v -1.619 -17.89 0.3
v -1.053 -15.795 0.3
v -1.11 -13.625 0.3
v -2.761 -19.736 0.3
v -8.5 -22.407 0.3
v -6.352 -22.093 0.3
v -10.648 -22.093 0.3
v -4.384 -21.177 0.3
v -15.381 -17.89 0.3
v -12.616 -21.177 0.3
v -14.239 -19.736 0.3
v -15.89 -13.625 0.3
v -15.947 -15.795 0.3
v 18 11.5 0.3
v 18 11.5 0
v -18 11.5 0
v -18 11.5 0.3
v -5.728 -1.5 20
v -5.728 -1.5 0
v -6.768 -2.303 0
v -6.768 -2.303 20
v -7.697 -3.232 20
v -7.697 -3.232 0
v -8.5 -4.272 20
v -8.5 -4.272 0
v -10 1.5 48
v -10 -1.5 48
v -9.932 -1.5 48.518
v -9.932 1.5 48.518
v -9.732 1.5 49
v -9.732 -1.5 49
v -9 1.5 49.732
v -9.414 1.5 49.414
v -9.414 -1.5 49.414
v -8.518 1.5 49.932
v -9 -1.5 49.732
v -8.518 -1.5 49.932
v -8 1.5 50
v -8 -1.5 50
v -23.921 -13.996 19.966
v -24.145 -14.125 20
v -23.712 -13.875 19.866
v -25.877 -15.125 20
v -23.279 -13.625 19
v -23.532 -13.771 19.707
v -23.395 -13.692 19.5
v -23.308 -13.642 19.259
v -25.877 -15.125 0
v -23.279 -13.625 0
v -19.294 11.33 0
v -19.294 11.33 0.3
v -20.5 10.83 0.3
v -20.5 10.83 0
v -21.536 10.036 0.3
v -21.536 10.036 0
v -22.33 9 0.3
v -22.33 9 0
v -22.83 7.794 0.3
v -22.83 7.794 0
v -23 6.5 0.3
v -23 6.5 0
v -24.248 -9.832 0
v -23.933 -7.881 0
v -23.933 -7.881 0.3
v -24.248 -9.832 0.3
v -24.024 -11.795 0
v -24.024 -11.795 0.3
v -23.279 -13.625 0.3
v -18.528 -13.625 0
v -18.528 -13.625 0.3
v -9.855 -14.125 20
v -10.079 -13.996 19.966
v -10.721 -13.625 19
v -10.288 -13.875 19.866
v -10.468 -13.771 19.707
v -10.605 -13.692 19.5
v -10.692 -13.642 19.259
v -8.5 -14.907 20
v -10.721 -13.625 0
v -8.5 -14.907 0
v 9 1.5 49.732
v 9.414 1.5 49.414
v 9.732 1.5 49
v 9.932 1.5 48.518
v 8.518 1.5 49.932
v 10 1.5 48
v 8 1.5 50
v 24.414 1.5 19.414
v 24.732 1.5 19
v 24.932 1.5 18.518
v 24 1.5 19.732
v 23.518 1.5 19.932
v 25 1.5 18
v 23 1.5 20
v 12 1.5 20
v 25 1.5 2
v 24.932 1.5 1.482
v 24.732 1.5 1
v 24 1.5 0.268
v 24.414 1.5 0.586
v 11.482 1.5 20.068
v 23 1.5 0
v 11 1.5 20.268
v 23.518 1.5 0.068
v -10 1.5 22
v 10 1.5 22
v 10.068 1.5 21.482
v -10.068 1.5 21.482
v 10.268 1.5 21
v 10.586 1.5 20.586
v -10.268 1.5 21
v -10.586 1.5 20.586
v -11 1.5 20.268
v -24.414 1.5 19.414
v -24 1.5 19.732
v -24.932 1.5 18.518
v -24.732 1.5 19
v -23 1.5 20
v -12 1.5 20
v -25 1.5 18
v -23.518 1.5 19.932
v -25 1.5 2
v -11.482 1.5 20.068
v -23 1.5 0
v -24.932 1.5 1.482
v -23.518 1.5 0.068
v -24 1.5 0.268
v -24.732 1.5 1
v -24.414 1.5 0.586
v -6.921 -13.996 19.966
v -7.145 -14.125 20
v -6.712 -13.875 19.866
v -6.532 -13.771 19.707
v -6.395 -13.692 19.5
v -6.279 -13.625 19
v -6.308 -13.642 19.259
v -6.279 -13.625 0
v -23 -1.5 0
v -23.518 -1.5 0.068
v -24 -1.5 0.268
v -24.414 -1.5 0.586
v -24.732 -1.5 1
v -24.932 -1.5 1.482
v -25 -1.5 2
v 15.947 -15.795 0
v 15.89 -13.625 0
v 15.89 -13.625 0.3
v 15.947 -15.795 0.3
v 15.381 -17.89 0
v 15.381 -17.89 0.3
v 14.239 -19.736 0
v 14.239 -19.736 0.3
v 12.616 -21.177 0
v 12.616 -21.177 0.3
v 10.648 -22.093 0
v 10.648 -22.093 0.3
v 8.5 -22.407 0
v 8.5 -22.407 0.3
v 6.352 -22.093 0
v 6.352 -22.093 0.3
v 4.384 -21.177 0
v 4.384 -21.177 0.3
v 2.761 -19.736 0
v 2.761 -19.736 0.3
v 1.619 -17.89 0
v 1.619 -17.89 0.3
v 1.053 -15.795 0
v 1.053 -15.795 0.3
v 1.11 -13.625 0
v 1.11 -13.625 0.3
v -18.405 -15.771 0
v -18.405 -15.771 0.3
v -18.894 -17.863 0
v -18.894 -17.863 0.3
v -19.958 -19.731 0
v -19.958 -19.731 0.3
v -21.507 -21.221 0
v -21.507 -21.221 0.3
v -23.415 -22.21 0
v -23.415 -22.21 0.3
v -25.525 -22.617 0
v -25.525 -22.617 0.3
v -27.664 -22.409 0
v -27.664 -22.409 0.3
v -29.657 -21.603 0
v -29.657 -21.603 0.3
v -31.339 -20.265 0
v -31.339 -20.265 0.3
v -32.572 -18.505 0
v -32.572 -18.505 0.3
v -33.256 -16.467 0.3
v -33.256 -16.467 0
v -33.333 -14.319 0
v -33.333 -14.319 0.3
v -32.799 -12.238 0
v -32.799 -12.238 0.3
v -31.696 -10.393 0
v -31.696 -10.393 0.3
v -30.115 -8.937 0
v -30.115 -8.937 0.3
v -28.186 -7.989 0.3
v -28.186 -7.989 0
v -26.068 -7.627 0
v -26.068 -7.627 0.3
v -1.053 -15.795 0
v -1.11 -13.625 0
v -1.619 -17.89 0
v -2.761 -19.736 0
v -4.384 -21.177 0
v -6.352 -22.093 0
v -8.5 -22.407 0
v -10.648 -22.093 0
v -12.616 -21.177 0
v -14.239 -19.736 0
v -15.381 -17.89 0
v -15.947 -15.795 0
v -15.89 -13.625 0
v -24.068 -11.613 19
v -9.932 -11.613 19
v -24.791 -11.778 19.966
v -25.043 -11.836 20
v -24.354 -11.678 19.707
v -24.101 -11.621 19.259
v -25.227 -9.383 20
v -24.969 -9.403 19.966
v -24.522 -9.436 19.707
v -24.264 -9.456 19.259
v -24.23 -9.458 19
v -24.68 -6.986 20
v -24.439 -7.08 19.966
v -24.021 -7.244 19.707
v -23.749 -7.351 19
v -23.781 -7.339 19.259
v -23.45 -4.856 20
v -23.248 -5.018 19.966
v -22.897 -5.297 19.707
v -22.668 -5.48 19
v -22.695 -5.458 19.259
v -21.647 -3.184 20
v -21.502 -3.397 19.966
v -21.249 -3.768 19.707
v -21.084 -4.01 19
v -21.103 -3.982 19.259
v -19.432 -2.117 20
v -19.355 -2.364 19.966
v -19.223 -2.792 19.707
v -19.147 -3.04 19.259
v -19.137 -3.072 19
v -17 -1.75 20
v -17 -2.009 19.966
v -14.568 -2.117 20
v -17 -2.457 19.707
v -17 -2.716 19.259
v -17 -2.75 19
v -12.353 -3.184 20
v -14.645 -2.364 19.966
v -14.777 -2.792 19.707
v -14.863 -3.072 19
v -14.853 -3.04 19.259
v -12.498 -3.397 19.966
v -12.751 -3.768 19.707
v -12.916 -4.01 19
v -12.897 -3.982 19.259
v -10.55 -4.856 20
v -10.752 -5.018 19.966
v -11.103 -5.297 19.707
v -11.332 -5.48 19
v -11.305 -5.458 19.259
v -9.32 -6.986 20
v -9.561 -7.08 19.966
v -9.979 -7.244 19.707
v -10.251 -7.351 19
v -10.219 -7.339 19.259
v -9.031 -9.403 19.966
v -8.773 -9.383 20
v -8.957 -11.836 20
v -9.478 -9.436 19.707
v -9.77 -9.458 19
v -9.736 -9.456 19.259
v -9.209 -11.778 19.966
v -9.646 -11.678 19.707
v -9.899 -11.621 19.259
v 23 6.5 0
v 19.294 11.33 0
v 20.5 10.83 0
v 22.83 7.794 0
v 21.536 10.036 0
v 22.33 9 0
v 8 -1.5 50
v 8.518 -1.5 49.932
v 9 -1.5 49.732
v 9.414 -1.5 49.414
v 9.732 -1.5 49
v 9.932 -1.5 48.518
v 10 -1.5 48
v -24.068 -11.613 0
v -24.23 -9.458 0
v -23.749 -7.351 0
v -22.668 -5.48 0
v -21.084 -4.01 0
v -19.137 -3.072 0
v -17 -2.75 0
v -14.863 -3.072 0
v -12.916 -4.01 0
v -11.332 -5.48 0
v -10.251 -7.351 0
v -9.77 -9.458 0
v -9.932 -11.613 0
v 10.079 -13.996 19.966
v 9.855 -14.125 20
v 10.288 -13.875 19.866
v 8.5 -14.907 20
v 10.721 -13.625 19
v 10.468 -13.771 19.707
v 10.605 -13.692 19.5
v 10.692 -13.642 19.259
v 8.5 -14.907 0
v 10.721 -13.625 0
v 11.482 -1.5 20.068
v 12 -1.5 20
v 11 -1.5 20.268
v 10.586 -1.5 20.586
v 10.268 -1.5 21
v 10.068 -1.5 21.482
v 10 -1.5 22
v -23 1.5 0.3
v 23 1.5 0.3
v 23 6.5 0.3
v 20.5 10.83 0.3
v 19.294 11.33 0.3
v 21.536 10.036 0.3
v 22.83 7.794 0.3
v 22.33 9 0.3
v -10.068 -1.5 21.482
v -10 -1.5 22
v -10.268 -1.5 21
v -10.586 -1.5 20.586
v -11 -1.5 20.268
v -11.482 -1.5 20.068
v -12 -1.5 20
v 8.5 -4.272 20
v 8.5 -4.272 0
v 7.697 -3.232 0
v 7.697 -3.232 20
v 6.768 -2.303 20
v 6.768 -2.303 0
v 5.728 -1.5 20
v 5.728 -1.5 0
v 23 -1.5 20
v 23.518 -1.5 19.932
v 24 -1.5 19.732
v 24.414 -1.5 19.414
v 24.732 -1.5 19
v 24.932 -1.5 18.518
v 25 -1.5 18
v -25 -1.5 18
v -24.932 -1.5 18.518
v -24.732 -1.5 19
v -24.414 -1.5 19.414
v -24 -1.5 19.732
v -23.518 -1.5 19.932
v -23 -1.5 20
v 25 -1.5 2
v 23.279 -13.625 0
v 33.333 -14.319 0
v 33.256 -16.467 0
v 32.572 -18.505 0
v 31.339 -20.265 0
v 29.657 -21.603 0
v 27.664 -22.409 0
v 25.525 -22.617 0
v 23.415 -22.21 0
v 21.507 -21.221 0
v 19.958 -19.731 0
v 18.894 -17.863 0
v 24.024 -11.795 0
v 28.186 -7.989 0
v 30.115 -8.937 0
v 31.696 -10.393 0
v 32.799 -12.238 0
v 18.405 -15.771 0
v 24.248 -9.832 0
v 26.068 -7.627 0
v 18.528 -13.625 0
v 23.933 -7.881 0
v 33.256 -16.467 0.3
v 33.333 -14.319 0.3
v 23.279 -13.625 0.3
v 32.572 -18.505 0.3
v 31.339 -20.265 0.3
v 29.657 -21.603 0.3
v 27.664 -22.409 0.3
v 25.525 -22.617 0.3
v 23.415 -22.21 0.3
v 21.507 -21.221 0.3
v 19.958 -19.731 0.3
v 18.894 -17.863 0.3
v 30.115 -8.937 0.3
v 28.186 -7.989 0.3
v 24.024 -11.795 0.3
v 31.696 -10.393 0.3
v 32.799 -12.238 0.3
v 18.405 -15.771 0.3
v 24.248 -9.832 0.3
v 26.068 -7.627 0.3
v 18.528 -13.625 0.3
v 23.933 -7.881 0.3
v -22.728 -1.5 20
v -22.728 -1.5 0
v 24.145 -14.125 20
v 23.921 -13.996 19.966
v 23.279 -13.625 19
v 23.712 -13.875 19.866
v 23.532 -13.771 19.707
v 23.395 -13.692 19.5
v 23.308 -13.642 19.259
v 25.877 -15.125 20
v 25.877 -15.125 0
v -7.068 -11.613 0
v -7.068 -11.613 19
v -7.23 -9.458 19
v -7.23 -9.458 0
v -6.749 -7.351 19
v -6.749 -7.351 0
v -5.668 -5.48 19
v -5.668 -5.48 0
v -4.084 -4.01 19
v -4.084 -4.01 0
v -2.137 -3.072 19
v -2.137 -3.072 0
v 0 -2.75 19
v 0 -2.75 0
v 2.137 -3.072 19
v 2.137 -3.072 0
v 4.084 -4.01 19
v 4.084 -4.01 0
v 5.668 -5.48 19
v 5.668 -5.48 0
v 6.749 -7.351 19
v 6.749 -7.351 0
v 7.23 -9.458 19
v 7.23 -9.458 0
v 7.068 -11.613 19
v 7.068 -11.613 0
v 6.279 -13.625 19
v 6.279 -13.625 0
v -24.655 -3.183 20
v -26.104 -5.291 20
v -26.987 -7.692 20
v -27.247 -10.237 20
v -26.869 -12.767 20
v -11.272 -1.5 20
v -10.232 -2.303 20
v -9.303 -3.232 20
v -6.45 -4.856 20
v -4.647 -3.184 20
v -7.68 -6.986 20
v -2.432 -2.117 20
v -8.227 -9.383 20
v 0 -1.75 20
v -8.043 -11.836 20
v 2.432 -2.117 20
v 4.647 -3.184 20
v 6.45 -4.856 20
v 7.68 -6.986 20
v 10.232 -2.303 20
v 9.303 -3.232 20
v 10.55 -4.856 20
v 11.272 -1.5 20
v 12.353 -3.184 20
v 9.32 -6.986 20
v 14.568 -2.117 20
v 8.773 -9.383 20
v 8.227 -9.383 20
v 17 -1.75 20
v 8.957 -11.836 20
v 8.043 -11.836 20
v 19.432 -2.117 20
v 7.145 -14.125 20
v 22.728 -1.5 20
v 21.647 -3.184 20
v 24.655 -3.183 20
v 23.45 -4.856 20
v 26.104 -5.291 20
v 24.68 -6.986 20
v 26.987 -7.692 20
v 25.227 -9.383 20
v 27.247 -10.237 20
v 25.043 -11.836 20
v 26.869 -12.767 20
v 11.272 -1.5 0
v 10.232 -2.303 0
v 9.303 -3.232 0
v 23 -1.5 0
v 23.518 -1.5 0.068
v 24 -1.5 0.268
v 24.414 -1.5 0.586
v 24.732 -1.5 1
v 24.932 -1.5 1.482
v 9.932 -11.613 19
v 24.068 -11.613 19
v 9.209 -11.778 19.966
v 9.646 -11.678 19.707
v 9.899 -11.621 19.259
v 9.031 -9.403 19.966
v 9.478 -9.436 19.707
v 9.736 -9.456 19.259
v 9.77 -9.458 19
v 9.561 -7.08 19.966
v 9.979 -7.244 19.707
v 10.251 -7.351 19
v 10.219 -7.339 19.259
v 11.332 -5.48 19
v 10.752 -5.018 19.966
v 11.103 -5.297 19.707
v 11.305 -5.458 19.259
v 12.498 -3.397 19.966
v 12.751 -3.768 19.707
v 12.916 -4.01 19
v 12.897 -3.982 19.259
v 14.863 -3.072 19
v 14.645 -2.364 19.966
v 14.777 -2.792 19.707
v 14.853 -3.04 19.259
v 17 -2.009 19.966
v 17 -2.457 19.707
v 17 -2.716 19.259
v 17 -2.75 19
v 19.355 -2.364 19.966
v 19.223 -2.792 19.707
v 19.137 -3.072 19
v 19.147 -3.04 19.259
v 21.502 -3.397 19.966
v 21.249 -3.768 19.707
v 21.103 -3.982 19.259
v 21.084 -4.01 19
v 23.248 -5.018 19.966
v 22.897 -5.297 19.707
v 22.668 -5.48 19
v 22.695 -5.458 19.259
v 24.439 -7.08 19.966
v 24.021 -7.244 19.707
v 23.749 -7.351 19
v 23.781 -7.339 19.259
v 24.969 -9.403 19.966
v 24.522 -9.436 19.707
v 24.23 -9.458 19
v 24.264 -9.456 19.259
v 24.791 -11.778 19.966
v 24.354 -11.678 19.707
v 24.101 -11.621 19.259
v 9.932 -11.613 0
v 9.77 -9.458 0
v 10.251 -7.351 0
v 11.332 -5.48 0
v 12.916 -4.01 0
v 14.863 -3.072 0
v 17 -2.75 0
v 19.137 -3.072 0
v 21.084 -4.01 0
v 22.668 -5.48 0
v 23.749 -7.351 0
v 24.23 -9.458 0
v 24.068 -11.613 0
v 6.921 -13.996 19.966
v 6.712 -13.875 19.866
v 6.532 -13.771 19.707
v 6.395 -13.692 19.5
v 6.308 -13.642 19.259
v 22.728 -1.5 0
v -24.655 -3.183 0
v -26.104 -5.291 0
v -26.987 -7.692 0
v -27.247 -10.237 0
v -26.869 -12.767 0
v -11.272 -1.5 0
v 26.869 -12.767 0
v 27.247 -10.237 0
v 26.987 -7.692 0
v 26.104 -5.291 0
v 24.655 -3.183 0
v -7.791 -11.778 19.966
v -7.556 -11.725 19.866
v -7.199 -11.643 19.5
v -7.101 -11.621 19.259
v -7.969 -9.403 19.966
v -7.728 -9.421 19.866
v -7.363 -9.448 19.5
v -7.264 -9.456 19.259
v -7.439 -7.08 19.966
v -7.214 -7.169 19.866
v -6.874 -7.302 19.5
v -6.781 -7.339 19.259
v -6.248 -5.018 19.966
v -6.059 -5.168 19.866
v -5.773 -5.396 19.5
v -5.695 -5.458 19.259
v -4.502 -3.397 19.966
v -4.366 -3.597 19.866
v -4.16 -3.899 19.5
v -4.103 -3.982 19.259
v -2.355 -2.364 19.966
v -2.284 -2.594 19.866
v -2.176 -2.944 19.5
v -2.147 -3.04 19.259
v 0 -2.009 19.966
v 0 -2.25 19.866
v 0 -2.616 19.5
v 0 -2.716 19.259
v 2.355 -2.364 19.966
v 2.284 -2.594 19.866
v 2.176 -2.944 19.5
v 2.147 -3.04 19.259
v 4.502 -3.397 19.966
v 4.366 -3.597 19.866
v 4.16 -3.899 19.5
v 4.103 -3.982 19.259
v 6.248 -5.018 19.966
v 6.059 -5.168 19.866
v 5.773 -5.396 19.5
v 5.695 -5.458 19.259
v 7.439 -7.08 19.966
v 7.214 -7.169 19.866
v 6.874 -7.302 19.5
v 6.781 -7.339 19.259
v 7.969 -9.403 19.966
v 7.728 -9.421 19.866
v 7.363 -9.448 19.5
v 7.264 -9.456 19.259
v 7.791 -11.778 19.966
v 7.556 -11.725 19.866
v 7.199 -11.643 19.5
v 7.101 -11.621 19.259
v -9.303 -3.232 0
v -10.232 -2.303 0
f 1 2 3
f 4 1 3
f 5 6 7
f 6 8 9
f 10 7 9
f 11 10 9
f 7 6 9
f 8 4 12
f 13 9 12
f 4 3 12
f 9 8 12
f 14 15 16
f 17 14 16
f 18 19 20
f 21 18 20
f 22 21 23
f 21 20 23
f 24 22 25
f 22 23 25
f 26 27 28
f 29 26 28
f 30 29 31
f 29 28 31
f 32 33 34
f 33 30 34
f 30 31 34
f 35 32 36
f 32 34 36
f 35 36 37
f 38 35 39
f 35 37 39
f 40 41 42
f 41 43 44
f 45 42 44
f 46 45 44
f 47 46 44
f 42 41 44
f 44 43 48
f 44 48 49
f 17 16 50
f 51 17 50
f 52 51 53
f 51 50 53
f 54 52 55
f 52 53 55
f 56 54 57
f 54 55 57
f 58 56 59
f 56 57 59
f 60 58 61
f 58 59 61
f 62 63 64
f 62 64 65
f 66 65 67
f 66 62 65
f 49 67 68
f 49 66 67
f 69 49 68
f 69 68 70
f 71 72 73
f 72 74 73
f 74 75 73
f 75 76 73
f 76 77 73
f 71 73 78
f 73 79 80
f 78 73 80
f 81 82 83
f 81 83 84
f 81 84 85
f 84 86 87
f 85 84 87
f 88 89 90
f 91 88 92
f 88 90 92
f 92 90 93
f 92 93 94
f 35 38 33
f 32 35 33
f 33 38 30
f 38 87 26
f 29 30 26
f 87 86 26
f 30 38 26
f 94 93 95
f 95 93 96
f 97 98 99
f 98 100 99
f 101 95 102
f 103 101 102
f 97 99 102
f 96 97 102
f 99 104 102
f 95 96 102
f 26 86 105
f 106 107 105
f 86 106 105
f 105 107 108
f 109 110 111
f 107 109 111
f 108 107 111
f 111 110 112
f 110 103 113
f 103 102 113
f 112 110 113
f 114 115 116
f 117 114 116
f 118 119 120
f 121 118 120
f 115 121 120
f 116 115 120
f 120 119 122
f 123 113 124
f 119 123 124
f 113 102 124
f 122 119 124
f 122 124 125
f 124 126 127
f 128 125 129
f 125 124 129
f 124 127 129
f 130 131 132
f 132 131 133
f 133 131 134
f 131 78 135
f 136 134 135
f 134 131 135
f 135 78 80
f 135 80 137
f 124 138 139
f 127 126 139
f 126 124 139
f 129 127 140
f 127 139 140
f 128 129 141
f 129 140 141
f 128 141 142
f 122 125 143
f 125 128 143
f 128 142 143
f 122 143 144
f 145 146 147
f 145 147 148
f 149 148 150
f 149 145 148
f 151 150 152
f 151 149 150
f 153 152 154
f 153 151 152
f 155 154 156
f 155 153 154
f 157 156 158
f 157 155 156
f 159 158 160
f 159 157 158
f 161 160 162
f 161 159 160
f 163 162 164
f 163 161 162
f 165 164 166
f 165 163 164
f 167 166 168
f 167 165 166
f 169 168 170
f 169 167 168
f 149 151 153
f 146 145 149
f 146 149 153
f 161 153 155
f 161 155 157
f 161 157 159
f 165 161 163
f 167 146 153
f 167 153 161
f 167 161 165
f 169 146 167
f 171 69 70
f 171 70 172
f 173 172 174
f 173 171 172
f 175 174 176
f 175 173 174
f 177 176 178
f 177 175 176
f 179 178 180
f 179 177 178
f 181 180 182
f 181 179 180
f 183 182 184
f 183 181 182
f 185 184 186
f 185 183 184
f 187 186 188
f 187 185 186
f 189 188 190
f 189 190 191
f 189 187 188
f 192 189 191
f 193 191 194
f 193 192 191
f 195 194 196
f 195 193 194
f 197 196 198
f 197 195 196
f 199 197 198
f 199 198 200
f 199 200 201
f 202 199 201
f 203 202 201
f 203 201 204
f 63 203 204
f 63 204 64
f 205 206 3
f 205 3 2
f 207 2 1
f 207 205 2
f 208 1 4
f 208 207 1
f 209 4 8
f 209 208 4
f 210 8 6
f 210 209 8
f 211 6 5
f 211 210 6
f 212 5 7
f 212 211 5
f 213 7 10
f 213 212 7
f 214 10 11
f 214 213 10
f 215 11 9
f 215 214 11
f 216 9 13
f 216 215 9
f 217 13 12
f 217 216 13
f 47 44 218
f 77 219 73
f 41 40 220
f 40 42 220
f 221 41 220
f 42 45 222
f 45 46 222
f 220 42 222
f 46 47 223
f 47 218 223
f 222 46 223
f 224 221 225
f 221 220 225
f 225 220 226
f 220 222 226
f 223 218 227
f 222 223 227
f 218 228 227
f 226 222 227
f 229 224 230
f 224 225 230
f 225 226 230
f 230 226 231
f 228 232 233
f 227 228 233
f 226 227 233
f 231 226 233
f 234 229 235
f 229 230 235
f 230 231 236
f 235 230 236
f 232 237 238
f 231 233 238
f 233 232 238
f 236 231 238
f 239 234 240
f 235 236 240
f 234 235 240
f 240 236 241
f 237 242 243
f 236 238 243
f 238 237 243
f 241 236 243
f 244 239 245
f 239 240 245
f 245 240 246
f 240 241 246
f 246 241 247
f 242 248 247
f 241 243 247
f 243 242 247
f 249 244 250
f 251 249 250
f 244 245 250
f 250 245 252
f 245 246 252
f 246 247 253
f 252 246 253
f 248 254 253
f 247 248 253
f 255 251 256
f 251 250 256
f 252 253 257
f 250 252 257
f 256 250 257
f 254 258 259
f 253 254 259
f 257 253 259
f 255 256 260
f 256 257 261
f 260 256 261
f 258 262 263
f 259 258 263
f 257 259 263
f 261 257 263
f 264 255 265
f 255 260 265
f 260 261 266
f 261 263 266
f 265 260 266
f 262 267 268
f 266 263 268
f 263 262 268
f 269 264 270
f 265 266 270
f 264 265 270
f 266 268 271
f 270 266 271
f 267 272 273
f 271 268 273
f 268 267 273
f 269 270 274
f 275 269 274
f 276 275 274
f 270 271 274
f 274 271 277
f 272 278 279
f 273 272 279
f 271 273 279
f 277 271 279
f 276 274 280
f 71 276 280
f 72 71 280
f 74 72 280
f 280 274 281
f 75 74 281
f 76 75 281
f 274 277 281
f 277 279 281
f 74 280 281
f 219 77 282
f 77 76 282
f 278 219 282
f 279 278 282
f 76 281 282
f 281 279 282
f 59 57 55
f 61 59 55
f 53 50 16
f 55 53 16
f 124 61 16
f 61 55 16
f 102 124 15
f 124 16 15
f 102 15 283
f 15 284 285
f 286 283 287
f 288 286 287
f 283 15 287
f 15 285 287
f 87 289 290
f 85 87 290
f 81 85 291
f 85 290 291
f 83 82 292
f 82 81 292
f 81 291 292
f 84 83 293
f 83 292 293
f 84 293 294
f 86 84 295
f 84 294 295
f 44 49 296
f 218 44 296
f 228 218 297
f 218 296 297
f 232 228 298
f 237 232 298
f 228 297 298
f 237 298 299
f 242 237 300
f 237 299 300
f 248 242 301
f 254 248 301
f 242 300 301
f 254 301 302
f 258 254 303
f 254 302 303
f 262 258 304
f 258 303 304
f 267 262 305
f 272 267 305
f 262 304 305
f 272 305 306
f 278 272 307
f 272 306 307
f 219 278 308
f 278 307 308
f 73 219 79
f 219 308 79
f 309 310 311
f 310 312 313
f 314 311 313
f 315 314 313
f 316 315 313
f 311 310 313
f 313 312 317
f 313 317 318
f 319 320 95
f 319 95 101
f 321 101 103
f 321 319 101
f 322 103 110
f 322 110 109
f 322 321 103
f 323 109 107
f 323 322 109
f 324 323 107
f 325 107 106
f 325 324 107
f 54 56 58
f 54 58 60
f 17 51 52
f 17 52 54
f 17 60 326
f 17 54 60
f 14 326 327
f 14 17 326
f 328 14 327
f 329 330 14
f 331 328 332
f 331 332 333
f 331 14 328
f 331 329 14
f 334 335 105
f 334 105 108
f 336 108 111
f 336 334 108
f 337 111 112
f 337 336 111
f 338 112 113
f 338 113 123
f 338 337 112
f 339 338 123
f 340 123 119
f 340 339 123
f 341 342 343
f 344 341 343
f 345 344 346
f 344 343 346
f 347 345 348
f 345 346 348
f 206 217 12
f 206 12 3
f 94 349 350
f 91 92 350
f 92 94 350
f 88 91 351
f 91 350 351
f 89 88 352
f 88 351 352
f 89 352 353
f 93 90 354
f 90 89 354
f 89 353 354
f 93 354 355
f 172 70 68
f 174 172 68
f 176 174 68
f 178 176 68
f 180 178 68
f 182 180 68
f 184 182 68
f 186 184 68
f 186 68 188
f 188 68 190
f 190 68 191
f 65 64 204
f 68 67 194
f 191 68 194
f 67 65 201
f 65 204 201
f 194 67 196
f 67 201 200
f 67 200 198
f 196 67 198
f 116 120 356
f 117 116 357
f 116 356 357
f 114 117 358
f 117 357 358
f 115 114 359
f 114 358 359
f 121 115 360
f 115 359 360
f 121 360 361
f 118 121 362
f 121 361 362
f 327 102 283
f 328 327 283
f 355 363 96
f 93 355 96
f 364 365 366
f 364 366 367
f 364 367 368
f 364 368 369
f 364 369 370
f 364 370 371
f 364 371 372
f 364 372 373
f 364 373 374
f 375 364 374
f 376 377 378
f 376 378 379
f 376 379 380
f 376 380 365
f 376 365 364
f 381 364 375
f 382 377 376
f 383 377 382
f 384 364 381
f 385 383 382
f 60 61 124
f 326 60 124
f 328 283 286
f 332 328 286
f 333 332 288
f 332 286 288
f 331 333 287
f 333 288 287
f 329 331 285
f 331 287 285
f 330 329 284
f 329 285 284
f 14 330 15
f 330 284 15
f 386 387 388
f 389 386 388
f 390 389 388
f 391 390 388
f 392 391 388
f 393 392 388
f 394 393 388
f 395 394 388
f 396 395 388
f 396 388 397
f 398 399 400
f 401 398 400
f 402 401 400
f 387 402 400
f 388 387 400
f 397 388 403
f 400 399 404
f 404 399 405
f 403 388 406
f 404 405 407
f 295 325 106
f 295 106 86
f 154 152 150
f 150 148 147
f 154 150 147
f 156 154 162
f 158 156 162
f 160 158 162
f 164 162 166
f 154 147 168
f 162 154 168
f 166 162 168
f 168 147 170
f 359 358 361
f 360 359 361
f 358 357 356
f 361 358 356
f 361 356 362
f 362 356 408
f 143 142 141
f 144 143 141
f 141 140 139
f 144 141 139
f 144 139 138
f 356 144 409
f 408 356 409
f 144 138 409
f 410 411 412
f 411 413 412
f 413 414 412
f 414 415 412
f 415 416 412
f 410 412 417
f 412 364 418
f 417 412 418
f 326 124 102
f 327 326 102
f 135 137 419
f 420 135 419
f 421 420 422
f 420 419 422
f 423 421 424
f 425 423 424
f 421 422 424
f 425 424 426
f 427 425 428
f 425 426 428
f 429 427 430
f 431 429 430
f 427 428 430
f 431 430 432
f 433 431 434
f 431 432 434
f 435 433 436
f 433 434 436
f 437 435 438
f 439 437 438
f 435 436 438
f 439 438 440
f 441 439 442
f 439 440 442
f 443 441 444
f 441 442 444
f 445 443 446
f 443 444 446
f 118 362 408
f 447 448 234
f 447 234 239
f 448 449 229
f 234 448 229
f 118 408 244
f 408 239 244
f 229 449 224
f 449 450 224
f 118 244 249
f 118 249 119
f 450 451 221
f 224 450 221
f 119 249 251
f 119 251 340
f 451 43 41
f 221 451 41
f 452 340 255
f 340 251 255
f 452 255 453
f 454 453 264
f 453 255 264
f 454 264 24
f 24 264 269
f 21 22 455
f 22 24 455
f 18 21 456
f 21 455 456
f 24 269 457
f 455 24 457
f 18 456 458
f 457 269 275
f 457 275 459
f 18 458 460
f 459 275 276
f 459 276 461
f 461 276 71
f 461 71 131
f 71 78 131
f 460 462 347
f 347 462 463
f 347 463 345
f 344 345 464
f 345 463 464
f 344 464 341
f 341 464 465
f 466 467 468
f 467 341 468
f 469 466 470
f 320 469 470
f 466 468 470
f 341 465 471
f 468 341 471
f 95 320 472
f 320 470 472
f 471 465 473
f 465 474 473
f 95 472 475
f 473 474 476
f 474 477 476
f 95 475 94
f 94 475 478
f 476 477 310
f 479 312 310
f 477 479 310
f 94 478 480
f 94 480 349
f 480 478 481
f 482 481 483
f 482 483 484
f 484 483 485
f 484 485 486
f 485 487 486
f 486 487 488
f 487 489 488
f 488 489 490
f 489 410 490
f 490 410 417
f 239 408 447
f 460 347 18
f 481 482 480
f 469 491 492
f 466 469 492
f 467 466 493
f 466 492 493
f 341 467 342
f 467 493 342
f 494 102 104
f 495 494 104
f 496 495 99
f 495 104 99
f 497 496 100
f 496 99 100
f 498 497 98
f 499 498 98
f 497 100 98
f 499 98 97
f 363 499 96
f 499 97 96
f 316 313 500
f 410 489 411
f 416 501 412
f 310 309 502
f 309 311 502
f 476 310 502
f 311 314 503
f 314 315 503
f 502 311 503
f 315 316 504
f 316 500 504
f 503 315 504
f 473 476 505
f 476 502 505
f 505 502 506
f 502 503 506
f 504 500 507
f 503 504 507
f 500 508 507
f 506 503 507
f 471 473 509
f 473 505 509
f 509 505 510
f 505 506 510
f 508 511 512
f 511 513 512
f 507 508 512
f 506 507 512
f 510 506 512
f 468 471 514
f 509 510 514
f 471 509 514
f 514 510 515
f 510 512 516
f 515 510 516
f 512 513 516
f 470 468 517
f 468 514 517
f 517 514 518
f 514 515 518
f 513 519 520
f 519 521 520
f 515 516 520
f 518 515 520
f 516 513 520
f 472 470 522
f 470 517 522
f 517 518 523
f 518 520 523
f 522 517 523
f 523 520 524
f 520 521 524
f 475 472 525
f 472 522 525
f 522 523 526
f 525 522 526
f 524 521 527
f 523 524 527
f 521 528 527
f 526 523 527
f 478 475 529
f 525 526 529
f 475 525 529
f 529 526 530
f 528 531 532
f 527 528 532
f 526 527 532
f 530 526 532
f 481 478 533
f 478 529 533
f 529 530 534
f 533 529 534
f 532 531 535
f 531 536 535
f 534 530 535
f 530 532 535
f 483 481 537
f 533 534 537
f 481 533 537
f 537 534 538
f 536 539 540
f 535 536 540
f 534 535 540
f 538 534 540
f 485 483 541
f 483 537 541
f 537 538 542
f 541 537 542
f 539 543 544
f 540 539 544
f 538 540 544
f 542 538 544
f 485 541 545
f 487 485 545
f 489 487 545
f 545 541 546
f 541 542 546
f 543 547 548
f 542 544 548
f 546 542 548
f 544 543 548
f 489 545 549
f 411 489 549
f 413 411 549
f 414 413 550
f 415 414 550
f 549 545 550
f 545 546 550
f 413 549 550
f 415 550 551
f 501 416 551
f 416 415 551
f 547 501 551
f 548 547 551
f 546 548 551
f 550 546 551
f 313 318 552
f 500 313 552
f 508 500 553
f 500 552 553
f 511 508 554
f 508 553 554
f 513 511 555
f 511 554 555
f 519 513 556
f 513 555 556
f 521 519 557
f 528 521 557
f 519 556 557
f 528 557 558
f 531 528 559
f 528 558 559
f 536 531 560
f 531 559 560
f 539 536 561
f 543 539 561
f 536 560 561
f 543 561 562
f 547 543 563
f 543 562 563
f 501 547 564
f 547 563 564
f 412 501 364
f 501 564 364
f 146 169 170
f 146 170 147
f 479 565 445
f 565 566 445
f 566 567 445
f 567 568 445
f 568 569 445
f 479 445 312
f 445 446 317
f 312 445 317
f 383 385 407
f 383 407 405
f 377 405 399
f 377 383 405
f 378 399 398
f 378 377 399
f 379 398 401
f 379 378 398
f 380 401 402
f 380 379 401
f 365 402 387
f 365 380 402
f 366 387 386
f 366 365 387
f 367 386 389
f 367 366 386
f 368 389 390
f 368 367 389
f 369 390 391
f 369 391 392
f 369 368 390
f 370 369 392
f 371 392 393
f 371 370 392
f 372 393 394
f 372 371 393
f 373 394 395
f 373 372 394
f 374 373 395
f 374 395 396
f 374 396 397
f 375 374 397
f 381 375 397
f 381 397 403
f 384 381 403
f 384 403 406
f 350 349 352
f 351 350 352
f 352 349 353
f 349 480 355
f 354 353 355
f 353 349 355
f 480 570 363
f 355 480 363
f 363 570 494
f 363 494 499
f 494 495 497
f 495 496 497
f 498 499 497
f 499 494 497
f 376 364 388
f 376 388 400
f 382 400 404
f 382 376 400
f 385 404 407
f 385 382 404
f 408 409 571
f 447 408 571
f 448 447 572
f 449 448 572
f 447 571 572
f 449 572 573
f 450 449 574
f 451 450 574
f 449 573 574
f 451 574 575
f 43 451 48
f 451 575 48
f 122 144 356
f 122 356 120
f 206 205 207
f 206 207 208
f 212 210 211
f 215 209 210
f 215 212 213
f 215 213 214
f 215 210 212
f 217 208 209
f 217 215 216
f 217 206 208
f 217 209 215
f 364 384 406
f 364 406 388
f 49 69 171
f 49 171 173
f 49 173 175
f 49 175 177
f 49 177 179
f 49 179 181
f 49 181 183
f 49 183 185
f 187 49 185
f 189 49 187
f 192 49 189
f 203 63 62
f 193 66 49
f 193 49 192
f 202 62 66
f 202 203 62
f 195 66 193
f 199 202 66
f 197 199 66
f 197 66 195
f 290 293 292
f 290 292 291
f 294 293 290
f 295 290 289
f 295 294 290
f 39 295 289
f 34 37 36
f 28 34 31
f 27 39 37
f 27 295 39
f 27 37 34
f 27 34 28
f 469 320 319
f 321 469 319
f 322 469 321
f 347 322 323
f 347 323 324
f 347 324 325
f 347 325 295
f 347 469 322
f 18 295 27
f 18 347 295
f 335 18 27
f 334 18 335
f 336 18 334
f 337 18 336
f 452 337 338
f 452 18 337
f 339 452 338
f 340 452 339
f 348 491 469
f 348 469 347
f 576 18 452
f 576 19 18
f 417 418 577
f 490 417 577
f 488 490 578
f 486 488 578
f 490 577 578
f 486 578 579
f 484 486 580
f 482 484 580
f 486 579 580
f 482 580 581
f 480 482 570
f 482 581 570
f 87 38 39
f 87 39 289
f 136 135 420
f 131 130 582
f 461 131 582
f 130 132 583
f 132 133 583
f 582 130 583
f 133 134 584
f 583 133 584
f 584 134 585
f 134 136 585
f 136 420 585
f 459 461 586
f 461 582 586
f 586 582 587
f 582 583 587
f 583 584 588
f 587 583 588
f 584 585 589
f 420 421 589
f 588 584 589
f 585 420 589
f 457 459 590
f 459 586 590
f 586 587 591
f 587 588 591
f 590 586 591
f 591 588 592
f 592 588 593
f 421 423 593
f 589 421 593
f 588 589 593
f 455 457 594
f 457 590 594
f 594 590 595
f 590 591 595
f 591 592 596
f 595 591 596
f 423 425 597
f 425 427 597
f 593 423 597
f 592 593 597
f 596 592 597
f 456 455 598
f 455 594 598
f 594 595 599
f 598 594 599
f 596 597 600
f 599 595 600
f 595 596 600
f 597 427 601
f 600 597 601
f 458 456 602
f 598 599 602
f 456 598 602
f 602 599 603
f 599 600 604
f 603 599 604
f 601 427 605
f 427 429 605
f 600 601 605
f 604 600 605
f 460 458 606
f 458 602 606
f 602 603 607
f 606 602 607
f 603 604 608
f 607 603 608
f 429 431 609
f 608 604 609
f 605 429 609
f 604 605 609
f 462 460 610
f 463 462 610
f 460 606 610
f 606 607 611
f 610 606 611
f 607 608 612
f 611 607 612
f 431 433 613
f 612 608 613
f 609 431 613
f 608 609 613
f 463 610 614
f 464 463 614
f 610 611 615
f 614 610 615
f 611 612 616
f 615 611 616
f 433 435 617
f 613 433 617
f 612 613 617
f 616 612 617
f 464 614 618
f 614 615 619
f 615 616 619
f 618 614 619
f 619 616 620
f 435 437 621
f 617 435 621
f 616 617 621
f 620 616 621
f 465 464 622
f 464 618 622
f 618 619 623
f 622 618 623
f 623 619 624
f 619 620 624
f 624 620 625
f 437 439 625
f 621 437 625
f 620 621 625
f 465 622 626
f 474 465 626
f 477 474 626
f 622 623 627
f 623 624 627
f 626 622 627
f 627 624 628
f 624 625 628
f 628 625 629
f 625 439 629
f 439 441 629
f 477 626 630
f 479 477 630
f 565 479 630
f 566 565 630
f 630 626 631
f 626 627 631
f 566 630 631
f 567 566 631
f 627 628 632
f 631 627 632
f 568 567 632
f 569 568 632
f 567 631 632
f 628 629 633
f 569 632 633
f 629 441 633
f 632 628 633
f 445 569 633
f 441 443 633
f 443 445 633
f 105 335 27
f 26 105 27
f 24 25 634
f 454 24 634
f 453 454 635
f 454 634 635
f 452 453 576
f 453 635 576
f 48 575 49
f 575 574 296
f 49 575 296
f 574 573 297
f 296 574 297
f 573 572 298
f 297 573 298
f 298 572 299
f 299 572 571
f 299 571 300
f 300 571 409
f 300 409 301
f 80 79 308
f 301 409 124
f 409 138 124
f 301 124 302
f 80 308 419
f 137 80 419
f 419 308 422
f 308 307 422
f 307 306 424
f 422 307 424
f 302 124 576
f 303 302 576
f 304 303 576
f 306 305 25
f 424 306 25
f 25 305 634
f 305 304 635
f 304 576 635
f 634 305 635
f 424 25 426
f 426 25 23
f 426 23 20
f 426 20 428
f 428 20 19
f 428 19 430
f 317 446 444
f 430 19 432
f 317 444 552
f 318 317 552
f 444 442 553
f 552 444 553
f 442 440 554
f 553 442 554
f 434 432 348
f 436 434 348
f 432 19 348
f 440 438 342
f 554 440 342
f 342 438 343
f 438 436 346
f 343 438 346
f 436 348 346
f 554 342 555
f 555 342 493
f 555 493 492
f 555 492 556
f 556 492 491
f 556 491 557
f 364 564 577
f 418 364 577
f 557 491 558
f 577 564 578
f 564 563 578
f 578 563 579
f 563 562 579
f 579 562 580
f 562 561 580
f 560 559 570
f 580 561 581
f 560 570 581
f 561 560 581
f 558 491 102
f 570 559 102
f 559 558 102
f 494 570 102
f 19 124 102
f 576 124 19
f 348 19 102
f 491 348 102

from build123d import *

# Parameters (mm, degrees)
SKETCH1_W             = 50
SKETCH1_H             = 3
WALL_MOUNT_DEPTH      = 50
BOSS_EXTRUDE3_DEPTH   = 20
CUT_EXTRUDE1_REACH    = 60.551
SKETCH4_W             = 15
SKETCH4_H             = 30
FILLET2_R             = 2
FILLET3_R             = 1
BOSS_EXTRUDE4_DEPTH   = 0.3
BOSS_EXTRUDE4_2_DEPTH = 0.3
BOSS_EXTRUDE4_3_DEPTH = 0.3
BOSS_EXTRUDE4_4_DEPTH = 0.3
BOSS_EXTRUDE4_5_DEPTH = 0.3


with BuildPart() as part:
    # Sketch1 → Wall mount (new body)
    with BuildSketch(Plane.XY):
        Rectangle(SKETCH1_W, SKETCH1_H)
    extrude(amount=WALL_MOUNT_DEPTH)

    # Sketch3 → Boss-Extrude3 (add)
    with BuildSketch(Plane.XY):
        with BuildLine():
            Line((-8.5, -14.907477288), (-6.278684177, -13.625))
            ThreePointArc((-6.278684177, -13.625), (0, -2.75), (6.278684177, -13.625))
            Line((6.278684177, -13.625), (8.5, -14.907477288))
            Line((8.5, -14.907477288), (10.721315823, -13.625))
            ThreePointArc((10.721315823, -13.625), (17, -2.75), (23.278684177, -13.625))
            Line((23.278684177, -13.625), (25.876760389, -15.125))
            ThreePointArc((25.876760389, -15.125), (26.986817136, -7.692190758), (22.728219619, -1.5))
            Line((22.728219619, -1.5), (11.271780381, -1.5))
            ThreePointArc((11.271780381, -1.5), (9.752155493, -2.752155493), (8.5, -4.271780381))
            ThreePointArc((8.5, -4.271780381), (7.247844507, -2.752155493), (5.728219619, -1.5))
            Line((5.728219619, -1.5), (-5.728219619, -1.5))
            ThreePointArc((-5.728219619, -1.5), (-7.247844507, -2.752155493), (-8.5, -4.271780381))
            ThreePointArc((-8.5, -4.271780381), (-9.752155493, -2.752155493), (-11.271780381, -1.5))
            Line((-11.271780381, -1.5), (-22.728219619, -1.5))
            ThreePointArc((-22.728219619, -1.5), (-26.986817136, -7.692190758), (-25.876760389, -15.125))
            Line((-25.876760389, -15.125), (-23.278684177, -13.625))
            ThreePointArc((-23.278684177, -13.625), (-17, -2.75), (-10.721315823, -13.625))
            Line((-10.721315823, -13.625), (-8.5, -14.907477288))
        make_face()
    extrude(amount=BOSS_EXTRUDE3_DEPTH)

    # Sketch4 → Cut-Extrude1 (cut, up to next)
    with BuildSketch(Plane.XZ.offset(1.5), mode=Mode.PRIVATE) as cut_extrude1_sk1:
        with Locations((-17.5, 35)):
            Rectangle(SKETCH4_W, SKETCH4_H)
    cut_extrude1_tool1 = extrude(cut_extrude1_sk1.sketch, amount=-CUT_EXTRUDE1_REACH, mode=Mode.PRIVATE) & part.part
    # Sketch4 → Cut-Extrude1 (cut, up to next)
    with BuildSketch(Plane.XZ.offset(1.5), mode=Mode.PRIVATE) as cut_extrude1_sk2:
        with Locations((17.5, 35)):
            Rectangle(SKETCH4_W, SKETCH4_H)
    cut_extrude1_tool2 = extrude(cut_extrude1_sk2.sketch, amount=-CUT_EXTRUDE1_REACH, mode=Mode.PRIVATE) & part.part
    add(cut_extrude1_tool1.solids().sort_by_distance((-17.5, -1.5, 35))[0], mode=Mode.SUBTRACT)
    add(cut_extrude1_tool2.solids().sort_by_distance((17.5, -1.5, 35))[0], mode=Mode.SUBTRACT)

    # Fillet2
    # the kernel refuses this fillet: 2 mm, written as the material it adds along each edge
    with BuildSketch(Plane(origin=(-10, -1.5, 20), x_dir=(-1, 0, 0), z_dir=(0, 1, 0))) as fillet2_piece_1:
        with BuildLine():
            CenterArc((FILLET2_R, FILLET2_R), FILLET2_R, 180, 90)
            Line((0, FILLET2_R), (0, 0))
            Line((0, 0), (FILLET2_R, 0))
        make_face()
    extrude(amount=3)
    with BuildSketch(Plane(origin=(10, -1.5, 20), x_dir=(1, 0, 0), z_dir=(0, 1, 0))) as fillet2_piece_2:
        with BuildLine():
            CenterArc((FILLET2_R, -FILLET2_R), FILLET2_R, 90, 90)
            Line((0, -FILLET2_R), (0, 0))
            Line((0, 0), (FILLET2_R, 0))
        make_face()
    extrude(amount=3)
    # the kernel refuses this fillet: 2 mm, written as the material it takes off along each edge
    with BuildSketch(Plane(origin=(25, 6.5, 0), x_dir=(-1, 0, 0), z_dir=(0, -1, 0)), Plane(origin=(-25, -1.5, 0), x_dir=(1, 0, 0), z_dir=(0, 1, 0)), Plane(origin=(25, -1.5, 20), x_dir=(-1, 0, 0), z_dir=(0, 1, 0))) as fillet2_2_piece_1:
        with BuildLine():
            CenterArc((FILLET2_R, -FILLET2_R), FILLET2_R, 90, 90)
            Line((0, -FILLET2_R), (0, 0))
            Line((0, 0), (FILLET2_R, 0))
        make_face()
    extrude(amount=8, mode=Mode.SUBTRACT)
    with BuildSketch(Plane(origin=(-10, -6.5, 50), x_dir=(1, 0, 0), z_dir=(0, 1, 0)), Plane(origin=(10, -6.5, 50), x_dir=(0, 0, -1), z_dir=(0, 1, 0))) as fillet2_2_piece_2:
        with BuildLine():
            CenterArc((FILLET2_R, FILLET2_R), FILLET2_R, 180, 90)
            Line((0, FILLET2_R), (0, 0))
            Line((0, 0), (FILLET2_R, 0))
        make_face()
    extrude(amount=13, mode=Mode.SUBTRACT)
    with BuildSketch(Plane(origin=(-25, -1.5, 20), x_dir=(1, 0, 0), z_dir=(0, 1, 0))) as fillet2_2_piece_3:
        with BuildLine():
            CenterArc((FILLET2_R, FILLET2_R), FILLET2_R, 180, 90)
            Line((0, FILLET2_R), (0, 0))
            Line((0, 0), (FILLET2_R, 0))
        make_face()
    extrude(amount=8, mode=Mode.SUBTRACT)

    # Fillet3
    fillet3_edges = [part.edges().sort_by_distance(p)[0] for p in [
        (0, -2.75, 20),
        (17, -2.75, 20),
        (-17, -2.75, 20),
    ]]
    fillet(fillet3_edges, radius=FILLET3_R)


with BuildPart() as body_2:
    # Sketch5 → Boss-Extrude4 (new body)
    with BuildSketch(Plane.XY):
        with BuildLine():
            Line((-23.278684177, -13.625), (-18.52829116, -13.625))
            ThreePointArc((-18.52829116, -13.625), (-31.338649406, -20.264821822), (-23.933462834, -7.881134001))
            ThreePointArc((-23.933462834, -7.881134001), (-24.203346883, -10.821153871), (-23.278684177, -13.625))
        make_face()
    extrude(amount=BOSS_EXTRUDE4_DEPTH)


with BuildPart() as body_3:
    # Sketch5 → Boss-Extrude4 2 (new body)
    with BuildSketch(Plane.XY):
        with BuildLine():
            Line((-23, 1.5), (23, 1.5))
            Line((23, 1.5), (23, 6.5))
            ThreePointArc((23, 6.5), (21.535533906, 10.035533906), (18, 11.5))
            Line((18, 11.5), (-18, 11.5))
            ThreePointArc((-18, 11.5), (-21.535533906, 10.035533906), (-23, 6.5))
            Line((-23, 6.5), (-23, 1.5))
        make_face()
    extrude(amount=BOSS_EXTRUDE4_2_DEPTH)


with BuildPart() as body_4:
    # Sketch5 → Boss-Extrude4 3 (new body)
    with BuildSketch(Plane.XY):
        with BuildLine():
            Line((-15.889536657, -13.625), (-1.110463343, -13.625))
            ThreePointArc((-1.110463343, -13.625), (-8.5, -22.407477288), (-15.889536657, -13.625))
        make_face()
    extrude(amount=BOSS_EXTRUDE4_3_DEPTH)


with BuildPart() as body_5:
    # Sketch5 → Boss-Extrude4 4 (new body)
    with BuildSketch(Plane.XY):
        with BuildLine():
            Line((1.110463343, -13.625), (15.889536657, -13.625))
            ThreePointArc((15.889536657, -13.625), (8.5, -22.407477288), (1.110463343, -13.625))
        make_face()
    extrude(amount=BOSS_EXTRUDE4_4_DEPTH)


with BuildPart() as body_6:
    # Sketch5 → Boss-Extrude4 5 (new body)
    with BuildSketch(Plane.XY):
        with BuildLine():
            Line((18.52829116, -13.625), (23.278684177, -13.625))
            ThreePointArc((23.278684177, -13.625), (24.203346883, -10.821153871), (23.933462834, -7.881134001))
            ThreePointArc((23.933462834, -7.881134001), (31.338649406, -20.264821822), (18.52829116, -13.625))
        make_face()
    extrude(amount=BOSS_EXTRUDE4_5_DEPTH)


solid = Compound([part.part, body_2.part, body_3.part, body_4.part, body_5.part, body_6.part])
